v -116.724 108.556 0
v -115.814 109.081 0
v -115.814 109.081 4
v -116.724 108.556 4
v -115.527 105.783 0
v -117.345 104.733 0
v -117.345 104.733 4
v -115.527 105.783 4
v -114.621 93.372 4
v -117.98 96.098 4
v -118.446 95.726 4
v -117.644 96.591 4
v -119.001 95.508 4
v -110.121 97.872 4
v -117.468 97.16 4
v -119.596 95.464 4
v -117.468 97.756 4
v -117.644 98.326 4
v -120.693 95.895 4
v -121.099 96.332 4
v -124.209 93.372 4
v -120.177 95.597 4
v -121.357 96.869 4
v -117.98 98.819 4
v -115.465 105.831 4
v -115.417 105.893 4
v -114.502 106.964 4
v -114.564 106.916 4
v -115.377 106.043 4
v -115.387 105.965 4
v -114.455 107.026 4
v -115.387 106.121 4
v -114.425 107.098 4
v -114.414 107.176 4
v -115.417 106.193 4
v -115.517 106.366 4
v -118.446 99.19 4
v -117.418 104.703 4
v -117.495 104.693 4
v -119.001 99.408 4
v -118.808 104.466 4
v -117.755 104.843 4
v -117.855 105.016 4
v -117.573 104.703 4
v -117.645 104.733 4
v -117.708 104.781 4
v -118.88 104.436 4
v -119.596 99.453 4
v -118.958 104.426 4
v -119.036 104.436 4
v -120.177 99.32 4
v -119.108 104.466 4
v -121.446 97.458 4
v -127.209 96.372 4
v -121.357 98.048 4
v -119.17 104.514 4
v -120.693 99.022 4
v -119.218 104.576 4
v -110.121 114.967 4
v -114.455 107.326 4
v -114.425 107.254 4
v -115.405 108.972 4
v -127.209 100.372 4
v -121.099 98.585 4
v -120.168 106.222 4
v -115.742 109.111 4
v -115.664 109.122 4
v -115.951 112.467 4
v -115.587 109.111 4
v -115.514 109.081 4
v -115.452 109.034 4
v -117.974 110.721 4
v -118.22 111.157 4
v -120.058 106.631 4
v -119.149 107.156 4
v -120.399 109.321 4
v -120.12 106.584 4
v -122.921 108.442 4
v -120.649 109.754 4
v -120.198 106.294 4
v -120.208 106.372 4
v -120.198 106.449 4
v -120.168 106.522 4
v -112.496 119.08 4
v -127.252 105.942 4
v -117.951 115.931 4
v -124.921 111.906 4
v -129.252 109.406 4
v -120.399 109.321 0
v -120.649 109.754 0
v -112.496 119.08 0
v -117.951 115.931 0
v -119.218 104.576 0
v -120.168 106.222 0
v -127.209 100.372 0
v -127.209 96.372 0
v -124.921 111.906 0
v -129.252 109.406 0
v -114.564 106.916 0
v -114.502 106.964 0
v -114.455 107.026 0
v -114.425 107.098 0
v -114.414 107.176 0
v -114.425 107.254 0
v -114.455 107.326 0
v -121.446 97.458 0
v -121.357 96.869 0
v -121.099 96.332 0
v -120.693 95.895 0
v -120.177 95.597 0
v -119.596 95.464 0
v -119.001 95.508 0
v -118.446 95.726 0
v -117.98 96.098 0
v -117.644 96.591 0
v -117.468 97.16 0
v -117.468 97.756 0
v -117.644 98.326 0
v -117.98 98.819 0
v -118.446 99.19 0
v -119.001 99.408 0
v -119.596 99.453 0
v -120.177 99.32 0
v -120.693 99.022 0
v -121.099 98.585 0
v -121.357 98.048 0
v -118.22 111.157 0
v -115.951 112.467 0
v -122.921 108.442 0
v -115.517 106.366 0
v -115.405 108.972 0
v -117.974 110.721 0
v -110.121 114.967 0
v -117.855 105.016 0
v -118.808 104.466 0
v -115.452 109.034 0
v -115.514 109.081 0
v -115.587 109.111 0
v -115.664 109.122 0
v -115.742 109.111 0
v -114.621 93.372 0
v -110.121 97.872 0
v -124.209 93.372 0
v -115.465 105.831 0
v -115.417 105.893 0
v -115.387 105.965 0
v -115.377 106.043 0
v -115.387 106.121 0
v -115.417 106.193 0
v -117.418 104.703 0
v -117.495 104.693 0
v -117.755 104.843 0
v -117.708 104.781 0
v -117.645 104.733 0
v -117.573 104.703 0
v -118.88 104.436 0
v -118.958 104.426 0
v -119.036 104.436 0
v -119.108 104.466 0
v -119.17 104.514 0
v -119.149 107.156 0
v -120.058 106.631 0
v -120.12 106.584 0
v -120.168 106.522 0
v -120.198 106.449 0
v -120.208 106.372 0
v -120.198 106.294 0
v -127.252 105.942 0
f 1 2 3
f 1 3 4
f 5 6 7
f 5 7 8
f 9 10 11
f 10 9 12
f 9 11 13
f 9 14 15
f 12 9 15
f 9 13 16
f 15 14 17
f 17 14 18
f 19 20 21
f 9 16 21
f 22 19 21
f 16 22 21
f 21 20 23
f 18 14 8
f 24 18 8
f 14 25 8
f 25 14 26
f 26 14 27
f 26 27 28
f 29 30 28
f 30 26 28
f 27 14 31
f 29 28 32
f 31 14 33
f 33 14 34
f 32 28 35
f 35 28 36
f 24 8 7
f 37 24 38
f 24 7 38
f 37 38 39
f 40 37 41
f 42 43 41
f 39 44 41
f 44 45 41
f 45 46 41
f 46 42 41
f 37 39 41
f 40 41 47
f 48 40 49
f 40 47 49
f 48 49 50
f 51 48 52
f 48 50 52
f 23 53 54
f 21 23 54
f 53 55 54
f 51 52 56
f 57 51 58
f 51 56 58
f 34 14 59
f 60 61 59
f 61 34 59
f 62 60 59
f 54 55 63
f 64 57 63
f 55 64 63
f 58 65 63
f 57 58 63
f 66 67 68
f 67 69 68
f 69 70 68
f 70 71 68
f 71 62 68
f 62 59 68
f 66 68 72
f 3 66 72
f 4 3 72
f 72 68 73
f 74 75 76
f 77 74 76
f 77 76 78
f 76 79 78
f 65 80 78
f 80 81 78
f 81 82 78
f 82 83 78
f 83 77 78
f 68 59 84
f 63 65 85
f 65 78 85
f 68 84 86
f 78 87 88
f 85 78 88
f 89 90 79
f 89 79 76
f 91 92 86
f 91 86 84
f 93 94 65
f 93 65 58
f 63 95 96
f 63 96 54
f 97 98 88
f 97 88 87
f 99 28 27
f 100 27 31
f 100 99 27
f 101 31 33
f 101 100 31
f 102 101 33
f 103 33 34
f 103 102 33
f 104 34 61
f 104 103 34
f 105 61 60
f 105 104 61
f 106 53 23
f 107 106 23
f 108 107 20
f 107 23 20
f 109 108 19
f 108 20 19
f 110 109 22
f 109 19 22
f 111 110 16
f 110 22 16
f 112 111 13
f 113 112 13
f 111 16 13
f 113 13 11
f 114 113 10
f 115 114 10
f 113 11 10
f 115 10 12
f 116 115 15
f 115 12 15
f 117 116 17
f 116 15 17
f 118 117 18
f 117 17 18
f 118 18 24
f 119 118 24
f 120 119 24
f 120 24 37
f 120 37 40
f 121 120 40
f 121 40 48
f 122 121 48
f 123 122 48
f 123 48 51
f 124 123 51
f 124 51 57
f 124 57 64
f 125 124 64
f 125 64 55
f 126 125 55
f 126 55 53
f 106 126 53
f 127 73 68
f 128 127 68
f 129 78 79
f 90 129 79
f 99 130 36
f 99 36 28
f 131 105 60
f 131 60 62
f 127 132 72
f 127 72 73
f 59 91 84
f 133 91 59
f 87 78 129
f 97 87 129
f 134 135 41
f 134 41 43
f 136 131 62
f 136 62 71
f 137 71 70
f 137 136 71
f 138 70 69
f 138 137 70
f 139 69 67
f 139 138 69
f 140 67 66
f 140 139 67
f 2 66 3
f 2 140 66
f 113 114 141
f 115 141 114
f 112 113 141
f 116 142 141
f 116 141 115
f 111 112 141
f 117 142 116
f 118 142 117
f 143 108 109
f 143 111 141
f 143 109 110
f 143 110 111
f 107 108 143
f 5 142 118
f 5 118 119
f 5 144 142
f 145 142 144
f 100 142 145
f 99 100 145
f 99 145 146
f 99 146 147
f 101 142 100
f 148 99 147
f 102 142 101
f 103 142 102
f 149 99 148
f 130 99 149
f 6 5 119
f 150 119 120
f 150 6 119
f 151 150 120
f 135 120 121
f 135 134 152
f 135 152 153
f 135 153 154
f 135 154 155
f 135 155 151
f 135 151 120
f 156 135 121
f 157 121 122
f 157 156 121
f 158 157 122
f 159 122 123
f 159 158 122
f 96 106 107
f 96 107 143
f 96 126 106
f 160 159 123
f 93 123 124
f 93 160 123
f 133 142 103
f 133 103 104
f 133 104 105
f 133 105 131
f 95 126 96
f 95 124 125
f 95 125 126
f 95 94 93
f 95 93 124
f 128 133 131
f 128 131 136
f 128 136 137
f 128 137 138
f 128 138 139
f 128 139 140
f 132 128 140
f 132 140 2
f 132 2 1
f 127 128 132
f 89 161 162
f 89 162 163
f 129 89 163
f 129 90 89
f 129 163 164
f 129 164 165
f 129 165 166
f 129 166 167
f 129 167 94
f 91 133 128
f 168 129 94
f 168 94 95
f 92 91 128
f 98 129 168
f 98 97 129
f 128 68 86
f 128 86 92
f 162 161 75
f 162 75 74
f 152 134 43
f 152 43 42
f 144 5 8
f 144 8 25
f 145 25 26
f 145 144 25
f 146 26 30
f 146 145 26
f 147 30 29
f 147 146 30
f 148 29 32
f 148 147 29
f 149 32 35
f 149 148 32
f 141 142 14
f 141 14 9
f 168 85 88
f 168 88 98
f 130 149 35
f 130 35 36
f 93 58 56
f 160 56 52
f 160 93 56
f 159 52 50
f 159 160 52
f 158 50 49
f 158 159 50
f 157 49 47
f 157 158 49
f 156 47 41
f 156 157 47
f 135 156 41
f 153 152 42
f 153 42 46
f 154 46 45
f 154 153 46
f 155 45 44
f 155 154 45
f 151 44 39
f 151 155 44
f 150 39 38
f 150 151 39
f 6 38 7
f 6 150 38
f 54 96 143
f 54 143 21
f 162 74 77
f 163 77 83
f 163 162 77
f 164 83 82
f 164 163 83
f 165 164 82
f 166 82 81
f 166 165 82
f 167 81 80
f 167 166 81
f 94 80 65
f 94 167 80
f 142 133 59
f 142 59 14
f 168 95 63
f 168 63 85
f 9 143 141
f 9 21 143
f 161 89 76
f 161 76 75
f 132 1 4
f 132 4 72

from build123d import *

# Parameters (mm, degrees)
EXTRUDE_1_DEPTH      = 4
SKETCH_3_W           = 15.588457268
SKETCH_3_H           = 4
EXTRUDE_3_DEPTH      = 2
SKETCH_19_W          = 15.588457268
SKETCH_19_H          = 4
EXTRUDE_5_DEPTH      = 5
SKETCH_4_W           = 5
SKETCH_4_H           = 4
EXTRUDE_6_DEPTH      = 5
SKETCH_22_R          = 2
CUT_EXTRUDE_17_DEPTH = 150
CHAMFER_1_SIZE       = 3
EXTRUDE_7_DEPTH      = 4
SKETCH_27_W          = 5
SKETCH_27_H          = 4
SKETCH_27_W_2        = 6.299038106
CUT_EXTRUDE_19_DEPTH = 1
CUT_EXTRUDE_22_DEPTH = 5


with BuildPart() as part:
    # 草图1 → 凸台-拉伸1 (new body)
    with BuildSketch(Plane.XY):
        Polygon((-111.620742166, 100.372452405), (-127.209199434, 100.372452405), (-127.251564891, 105.942182287), (-111.620742166, 114.966641994), align=None)
    extrude(amount=EXTRUDE_1_DEPTH)

    # 草图3 → 凸台-拉伸3 (add)
    with BuildSketch(Plane.XZ.offset(-100.372452405)):
        with Locations((-119.4149708, 2)):
            Rectangle(SKETCH_3_W, SKETCH_3_H)
    extrude(amount=EXTRUDE_3_DEPTH)

    # 草图19 → 凸台-拉伸5 (add)
    with BuildSketch(Plane.XZ.offset(-98.372452405)):
        with Locations((-119.4149708, 2)):
            Rectangle(SKETCH_19_W, SKETCH_19_H)
    extrude(amount=EXTRUDE_5_DEPTH)

    # 草图4 → 凸台-拉伸6 (add)
    with BuildSketch(Plane(origin=(-77.687201819, 134.558180648, 0), x_dir=(0.8660254037844398, 0.49999999999999806, 0), z_dir=(-0.499999999999998, 0.8660254037844397, 0))):
        with Locations((-54.731996723, -2)):
            Rectangle(SKETCH_4_W, SKETCH_4_H)
        with Locations((-41.683077308, -2)):
            Rectangle(SKETCH_4_W, SKETCH_4_H)
    extrude(amount=EXTRUDE_6_DEPTH)

    # 草图22 → 切除-拉伸17 (cut)
    with BuildSketch(Plane(origin=(0.801824419, -4.558538123, 5), x_dir=(0.9999710727819138, 0.007606155361845765, 0), z_dir=(0, 0, 1))):
        with Locations(Location((-119.468439353, 102.928528754, 0), (0, 0, 179.564195197))):
            Circle(SKETCH_22_R)
    extrude(amount=-CUT_EXTRUDE_17_DEPTH, mode=Mode.SUBTRACT)

    # 倒角1
    chamfer_1_edges = [part.edges().sort_by_distance(p)[0] for p in [
        (-127.209199434, 93.372452405, 2),
        (-111.620742166, 93.372452405, 2),
    ]]
    chamfer(chamfer_1_edges, length=CHAMFER_1_SIZE)

    # 草图25 → 凸台-拉伸7 (add)
    with BuildSketch(Plane(origin=(0, 0, 0), x_dir=(-1, 0, 0), z_dir=(0, 0, -1))):
        Polygon((111.620742166, 96.372452405), (111.620742166, 114.966641994), (114.120742166, 119.296769013), (112.995742166, 119.946288066), (110.120742166, 114.966641994), (110.120742166, 97.872452405), align=None)
    extrude(amount=-EXTRUDE_7_DEPTH)

    # 草图27 → 切除-拉伸19 (cut)
    with BuildSketch(Plane(origin=(-80.187201819, 138.888307667, 0), x_dir=(0.8660254037844395, 0.4999999999999986, 0), z_dir=(-0.4999999999999986, 0.8660254037844395, 0))):
        with Locations((-54.731996723, -2)):
            Rectangle(SKETCH_27_W, SKETCH_27_H)
        with Locations((-41.033558255, -2)):
            Rectangle(SKETCH_27_W_2, SKETCH_27_H)
    extrude(amount=-CUT_EXTRUDE_19_DEPTH, mode=Mode.SUBTRACT)

    # 草图30 → 切除-拉伸22 (cut)
    with BuildSketch(Plane(origin=(0.801824419, -4.558538123, 0), x_dir=(-0.9999710727819139, -0.007606155361845766, 0), z_dir=(0, 0, -1))):
        with BuildLine():
            Line((116.661773389, 114.005519488), (117.895269421, 116.180028062))
            Line((117.895269421, 116.180028062), (118.865299077, 117.929039916))
            Line((118.865299077, 117.929039916), (121.330841562, 116.561611031))
            Line((121.330841562, 116.561611031), (120.330719024, 114.798512507))
            Line((120.330719024, 114.798512507), (119.097222993, 112.624003932))
            Line((119.097222993, 112.624003932), (120.010516594, 112.105935599))
            ThreePointArc((120.010516594, 112.105935599), (120.15167585, 111.924842132), (120.123438099, 111.696975046))
            Line((120.123438099, 111.696975046), (119.185981115, 110.04434853))
            ThreePointArc((119.185981115, 110.04434853), (119.004887648, 109.903189273), (118.777020562, 109.931427025))
            Line((118.777020562, 109.931427025), (117.82023679, 110.474165279))
            Line((117.82023679, 110.474165279), (117.721557107, 110.300204593))
            ThreePointArc((117.721557107, 110.300204593), (117.54046364, 110.159045336), (117.312596554, 110.187283087))
            Line((117.312596554, 110.187283087), (115.486009352, 111.223419754))
            ThreePointArc((115.486009352, 111.223419754), (115.344850096, 111.404513221), (115.373087847, 111.632380307))
            Line((115.373087847, 111.632380307), (115.471767529, 111.806340993))
            Line((115.471767529, 111.806340993), (114.514983756, 112.349079246))
            ThreePointArc((114.514983756, 112.349079246), (114.3738245, 112.530172713), (114.402062251, 112.758039799))
            Line((114.402062251, 112.758039799), (115.339519235, 114.410666316))
            ThreePointArc((115.339519235, 114.410666316), (115.520612702, 114.551825572), (115.748479788, 114.523587821))
            Line((115.748479788, 114.523587821), (116.661773389, 114.005519488))
        make_face()
    extrude(amount=-CUT_EXTRUDE_22_DEPTH, mode=Mode.SUBTRACT)


solid = part.part
